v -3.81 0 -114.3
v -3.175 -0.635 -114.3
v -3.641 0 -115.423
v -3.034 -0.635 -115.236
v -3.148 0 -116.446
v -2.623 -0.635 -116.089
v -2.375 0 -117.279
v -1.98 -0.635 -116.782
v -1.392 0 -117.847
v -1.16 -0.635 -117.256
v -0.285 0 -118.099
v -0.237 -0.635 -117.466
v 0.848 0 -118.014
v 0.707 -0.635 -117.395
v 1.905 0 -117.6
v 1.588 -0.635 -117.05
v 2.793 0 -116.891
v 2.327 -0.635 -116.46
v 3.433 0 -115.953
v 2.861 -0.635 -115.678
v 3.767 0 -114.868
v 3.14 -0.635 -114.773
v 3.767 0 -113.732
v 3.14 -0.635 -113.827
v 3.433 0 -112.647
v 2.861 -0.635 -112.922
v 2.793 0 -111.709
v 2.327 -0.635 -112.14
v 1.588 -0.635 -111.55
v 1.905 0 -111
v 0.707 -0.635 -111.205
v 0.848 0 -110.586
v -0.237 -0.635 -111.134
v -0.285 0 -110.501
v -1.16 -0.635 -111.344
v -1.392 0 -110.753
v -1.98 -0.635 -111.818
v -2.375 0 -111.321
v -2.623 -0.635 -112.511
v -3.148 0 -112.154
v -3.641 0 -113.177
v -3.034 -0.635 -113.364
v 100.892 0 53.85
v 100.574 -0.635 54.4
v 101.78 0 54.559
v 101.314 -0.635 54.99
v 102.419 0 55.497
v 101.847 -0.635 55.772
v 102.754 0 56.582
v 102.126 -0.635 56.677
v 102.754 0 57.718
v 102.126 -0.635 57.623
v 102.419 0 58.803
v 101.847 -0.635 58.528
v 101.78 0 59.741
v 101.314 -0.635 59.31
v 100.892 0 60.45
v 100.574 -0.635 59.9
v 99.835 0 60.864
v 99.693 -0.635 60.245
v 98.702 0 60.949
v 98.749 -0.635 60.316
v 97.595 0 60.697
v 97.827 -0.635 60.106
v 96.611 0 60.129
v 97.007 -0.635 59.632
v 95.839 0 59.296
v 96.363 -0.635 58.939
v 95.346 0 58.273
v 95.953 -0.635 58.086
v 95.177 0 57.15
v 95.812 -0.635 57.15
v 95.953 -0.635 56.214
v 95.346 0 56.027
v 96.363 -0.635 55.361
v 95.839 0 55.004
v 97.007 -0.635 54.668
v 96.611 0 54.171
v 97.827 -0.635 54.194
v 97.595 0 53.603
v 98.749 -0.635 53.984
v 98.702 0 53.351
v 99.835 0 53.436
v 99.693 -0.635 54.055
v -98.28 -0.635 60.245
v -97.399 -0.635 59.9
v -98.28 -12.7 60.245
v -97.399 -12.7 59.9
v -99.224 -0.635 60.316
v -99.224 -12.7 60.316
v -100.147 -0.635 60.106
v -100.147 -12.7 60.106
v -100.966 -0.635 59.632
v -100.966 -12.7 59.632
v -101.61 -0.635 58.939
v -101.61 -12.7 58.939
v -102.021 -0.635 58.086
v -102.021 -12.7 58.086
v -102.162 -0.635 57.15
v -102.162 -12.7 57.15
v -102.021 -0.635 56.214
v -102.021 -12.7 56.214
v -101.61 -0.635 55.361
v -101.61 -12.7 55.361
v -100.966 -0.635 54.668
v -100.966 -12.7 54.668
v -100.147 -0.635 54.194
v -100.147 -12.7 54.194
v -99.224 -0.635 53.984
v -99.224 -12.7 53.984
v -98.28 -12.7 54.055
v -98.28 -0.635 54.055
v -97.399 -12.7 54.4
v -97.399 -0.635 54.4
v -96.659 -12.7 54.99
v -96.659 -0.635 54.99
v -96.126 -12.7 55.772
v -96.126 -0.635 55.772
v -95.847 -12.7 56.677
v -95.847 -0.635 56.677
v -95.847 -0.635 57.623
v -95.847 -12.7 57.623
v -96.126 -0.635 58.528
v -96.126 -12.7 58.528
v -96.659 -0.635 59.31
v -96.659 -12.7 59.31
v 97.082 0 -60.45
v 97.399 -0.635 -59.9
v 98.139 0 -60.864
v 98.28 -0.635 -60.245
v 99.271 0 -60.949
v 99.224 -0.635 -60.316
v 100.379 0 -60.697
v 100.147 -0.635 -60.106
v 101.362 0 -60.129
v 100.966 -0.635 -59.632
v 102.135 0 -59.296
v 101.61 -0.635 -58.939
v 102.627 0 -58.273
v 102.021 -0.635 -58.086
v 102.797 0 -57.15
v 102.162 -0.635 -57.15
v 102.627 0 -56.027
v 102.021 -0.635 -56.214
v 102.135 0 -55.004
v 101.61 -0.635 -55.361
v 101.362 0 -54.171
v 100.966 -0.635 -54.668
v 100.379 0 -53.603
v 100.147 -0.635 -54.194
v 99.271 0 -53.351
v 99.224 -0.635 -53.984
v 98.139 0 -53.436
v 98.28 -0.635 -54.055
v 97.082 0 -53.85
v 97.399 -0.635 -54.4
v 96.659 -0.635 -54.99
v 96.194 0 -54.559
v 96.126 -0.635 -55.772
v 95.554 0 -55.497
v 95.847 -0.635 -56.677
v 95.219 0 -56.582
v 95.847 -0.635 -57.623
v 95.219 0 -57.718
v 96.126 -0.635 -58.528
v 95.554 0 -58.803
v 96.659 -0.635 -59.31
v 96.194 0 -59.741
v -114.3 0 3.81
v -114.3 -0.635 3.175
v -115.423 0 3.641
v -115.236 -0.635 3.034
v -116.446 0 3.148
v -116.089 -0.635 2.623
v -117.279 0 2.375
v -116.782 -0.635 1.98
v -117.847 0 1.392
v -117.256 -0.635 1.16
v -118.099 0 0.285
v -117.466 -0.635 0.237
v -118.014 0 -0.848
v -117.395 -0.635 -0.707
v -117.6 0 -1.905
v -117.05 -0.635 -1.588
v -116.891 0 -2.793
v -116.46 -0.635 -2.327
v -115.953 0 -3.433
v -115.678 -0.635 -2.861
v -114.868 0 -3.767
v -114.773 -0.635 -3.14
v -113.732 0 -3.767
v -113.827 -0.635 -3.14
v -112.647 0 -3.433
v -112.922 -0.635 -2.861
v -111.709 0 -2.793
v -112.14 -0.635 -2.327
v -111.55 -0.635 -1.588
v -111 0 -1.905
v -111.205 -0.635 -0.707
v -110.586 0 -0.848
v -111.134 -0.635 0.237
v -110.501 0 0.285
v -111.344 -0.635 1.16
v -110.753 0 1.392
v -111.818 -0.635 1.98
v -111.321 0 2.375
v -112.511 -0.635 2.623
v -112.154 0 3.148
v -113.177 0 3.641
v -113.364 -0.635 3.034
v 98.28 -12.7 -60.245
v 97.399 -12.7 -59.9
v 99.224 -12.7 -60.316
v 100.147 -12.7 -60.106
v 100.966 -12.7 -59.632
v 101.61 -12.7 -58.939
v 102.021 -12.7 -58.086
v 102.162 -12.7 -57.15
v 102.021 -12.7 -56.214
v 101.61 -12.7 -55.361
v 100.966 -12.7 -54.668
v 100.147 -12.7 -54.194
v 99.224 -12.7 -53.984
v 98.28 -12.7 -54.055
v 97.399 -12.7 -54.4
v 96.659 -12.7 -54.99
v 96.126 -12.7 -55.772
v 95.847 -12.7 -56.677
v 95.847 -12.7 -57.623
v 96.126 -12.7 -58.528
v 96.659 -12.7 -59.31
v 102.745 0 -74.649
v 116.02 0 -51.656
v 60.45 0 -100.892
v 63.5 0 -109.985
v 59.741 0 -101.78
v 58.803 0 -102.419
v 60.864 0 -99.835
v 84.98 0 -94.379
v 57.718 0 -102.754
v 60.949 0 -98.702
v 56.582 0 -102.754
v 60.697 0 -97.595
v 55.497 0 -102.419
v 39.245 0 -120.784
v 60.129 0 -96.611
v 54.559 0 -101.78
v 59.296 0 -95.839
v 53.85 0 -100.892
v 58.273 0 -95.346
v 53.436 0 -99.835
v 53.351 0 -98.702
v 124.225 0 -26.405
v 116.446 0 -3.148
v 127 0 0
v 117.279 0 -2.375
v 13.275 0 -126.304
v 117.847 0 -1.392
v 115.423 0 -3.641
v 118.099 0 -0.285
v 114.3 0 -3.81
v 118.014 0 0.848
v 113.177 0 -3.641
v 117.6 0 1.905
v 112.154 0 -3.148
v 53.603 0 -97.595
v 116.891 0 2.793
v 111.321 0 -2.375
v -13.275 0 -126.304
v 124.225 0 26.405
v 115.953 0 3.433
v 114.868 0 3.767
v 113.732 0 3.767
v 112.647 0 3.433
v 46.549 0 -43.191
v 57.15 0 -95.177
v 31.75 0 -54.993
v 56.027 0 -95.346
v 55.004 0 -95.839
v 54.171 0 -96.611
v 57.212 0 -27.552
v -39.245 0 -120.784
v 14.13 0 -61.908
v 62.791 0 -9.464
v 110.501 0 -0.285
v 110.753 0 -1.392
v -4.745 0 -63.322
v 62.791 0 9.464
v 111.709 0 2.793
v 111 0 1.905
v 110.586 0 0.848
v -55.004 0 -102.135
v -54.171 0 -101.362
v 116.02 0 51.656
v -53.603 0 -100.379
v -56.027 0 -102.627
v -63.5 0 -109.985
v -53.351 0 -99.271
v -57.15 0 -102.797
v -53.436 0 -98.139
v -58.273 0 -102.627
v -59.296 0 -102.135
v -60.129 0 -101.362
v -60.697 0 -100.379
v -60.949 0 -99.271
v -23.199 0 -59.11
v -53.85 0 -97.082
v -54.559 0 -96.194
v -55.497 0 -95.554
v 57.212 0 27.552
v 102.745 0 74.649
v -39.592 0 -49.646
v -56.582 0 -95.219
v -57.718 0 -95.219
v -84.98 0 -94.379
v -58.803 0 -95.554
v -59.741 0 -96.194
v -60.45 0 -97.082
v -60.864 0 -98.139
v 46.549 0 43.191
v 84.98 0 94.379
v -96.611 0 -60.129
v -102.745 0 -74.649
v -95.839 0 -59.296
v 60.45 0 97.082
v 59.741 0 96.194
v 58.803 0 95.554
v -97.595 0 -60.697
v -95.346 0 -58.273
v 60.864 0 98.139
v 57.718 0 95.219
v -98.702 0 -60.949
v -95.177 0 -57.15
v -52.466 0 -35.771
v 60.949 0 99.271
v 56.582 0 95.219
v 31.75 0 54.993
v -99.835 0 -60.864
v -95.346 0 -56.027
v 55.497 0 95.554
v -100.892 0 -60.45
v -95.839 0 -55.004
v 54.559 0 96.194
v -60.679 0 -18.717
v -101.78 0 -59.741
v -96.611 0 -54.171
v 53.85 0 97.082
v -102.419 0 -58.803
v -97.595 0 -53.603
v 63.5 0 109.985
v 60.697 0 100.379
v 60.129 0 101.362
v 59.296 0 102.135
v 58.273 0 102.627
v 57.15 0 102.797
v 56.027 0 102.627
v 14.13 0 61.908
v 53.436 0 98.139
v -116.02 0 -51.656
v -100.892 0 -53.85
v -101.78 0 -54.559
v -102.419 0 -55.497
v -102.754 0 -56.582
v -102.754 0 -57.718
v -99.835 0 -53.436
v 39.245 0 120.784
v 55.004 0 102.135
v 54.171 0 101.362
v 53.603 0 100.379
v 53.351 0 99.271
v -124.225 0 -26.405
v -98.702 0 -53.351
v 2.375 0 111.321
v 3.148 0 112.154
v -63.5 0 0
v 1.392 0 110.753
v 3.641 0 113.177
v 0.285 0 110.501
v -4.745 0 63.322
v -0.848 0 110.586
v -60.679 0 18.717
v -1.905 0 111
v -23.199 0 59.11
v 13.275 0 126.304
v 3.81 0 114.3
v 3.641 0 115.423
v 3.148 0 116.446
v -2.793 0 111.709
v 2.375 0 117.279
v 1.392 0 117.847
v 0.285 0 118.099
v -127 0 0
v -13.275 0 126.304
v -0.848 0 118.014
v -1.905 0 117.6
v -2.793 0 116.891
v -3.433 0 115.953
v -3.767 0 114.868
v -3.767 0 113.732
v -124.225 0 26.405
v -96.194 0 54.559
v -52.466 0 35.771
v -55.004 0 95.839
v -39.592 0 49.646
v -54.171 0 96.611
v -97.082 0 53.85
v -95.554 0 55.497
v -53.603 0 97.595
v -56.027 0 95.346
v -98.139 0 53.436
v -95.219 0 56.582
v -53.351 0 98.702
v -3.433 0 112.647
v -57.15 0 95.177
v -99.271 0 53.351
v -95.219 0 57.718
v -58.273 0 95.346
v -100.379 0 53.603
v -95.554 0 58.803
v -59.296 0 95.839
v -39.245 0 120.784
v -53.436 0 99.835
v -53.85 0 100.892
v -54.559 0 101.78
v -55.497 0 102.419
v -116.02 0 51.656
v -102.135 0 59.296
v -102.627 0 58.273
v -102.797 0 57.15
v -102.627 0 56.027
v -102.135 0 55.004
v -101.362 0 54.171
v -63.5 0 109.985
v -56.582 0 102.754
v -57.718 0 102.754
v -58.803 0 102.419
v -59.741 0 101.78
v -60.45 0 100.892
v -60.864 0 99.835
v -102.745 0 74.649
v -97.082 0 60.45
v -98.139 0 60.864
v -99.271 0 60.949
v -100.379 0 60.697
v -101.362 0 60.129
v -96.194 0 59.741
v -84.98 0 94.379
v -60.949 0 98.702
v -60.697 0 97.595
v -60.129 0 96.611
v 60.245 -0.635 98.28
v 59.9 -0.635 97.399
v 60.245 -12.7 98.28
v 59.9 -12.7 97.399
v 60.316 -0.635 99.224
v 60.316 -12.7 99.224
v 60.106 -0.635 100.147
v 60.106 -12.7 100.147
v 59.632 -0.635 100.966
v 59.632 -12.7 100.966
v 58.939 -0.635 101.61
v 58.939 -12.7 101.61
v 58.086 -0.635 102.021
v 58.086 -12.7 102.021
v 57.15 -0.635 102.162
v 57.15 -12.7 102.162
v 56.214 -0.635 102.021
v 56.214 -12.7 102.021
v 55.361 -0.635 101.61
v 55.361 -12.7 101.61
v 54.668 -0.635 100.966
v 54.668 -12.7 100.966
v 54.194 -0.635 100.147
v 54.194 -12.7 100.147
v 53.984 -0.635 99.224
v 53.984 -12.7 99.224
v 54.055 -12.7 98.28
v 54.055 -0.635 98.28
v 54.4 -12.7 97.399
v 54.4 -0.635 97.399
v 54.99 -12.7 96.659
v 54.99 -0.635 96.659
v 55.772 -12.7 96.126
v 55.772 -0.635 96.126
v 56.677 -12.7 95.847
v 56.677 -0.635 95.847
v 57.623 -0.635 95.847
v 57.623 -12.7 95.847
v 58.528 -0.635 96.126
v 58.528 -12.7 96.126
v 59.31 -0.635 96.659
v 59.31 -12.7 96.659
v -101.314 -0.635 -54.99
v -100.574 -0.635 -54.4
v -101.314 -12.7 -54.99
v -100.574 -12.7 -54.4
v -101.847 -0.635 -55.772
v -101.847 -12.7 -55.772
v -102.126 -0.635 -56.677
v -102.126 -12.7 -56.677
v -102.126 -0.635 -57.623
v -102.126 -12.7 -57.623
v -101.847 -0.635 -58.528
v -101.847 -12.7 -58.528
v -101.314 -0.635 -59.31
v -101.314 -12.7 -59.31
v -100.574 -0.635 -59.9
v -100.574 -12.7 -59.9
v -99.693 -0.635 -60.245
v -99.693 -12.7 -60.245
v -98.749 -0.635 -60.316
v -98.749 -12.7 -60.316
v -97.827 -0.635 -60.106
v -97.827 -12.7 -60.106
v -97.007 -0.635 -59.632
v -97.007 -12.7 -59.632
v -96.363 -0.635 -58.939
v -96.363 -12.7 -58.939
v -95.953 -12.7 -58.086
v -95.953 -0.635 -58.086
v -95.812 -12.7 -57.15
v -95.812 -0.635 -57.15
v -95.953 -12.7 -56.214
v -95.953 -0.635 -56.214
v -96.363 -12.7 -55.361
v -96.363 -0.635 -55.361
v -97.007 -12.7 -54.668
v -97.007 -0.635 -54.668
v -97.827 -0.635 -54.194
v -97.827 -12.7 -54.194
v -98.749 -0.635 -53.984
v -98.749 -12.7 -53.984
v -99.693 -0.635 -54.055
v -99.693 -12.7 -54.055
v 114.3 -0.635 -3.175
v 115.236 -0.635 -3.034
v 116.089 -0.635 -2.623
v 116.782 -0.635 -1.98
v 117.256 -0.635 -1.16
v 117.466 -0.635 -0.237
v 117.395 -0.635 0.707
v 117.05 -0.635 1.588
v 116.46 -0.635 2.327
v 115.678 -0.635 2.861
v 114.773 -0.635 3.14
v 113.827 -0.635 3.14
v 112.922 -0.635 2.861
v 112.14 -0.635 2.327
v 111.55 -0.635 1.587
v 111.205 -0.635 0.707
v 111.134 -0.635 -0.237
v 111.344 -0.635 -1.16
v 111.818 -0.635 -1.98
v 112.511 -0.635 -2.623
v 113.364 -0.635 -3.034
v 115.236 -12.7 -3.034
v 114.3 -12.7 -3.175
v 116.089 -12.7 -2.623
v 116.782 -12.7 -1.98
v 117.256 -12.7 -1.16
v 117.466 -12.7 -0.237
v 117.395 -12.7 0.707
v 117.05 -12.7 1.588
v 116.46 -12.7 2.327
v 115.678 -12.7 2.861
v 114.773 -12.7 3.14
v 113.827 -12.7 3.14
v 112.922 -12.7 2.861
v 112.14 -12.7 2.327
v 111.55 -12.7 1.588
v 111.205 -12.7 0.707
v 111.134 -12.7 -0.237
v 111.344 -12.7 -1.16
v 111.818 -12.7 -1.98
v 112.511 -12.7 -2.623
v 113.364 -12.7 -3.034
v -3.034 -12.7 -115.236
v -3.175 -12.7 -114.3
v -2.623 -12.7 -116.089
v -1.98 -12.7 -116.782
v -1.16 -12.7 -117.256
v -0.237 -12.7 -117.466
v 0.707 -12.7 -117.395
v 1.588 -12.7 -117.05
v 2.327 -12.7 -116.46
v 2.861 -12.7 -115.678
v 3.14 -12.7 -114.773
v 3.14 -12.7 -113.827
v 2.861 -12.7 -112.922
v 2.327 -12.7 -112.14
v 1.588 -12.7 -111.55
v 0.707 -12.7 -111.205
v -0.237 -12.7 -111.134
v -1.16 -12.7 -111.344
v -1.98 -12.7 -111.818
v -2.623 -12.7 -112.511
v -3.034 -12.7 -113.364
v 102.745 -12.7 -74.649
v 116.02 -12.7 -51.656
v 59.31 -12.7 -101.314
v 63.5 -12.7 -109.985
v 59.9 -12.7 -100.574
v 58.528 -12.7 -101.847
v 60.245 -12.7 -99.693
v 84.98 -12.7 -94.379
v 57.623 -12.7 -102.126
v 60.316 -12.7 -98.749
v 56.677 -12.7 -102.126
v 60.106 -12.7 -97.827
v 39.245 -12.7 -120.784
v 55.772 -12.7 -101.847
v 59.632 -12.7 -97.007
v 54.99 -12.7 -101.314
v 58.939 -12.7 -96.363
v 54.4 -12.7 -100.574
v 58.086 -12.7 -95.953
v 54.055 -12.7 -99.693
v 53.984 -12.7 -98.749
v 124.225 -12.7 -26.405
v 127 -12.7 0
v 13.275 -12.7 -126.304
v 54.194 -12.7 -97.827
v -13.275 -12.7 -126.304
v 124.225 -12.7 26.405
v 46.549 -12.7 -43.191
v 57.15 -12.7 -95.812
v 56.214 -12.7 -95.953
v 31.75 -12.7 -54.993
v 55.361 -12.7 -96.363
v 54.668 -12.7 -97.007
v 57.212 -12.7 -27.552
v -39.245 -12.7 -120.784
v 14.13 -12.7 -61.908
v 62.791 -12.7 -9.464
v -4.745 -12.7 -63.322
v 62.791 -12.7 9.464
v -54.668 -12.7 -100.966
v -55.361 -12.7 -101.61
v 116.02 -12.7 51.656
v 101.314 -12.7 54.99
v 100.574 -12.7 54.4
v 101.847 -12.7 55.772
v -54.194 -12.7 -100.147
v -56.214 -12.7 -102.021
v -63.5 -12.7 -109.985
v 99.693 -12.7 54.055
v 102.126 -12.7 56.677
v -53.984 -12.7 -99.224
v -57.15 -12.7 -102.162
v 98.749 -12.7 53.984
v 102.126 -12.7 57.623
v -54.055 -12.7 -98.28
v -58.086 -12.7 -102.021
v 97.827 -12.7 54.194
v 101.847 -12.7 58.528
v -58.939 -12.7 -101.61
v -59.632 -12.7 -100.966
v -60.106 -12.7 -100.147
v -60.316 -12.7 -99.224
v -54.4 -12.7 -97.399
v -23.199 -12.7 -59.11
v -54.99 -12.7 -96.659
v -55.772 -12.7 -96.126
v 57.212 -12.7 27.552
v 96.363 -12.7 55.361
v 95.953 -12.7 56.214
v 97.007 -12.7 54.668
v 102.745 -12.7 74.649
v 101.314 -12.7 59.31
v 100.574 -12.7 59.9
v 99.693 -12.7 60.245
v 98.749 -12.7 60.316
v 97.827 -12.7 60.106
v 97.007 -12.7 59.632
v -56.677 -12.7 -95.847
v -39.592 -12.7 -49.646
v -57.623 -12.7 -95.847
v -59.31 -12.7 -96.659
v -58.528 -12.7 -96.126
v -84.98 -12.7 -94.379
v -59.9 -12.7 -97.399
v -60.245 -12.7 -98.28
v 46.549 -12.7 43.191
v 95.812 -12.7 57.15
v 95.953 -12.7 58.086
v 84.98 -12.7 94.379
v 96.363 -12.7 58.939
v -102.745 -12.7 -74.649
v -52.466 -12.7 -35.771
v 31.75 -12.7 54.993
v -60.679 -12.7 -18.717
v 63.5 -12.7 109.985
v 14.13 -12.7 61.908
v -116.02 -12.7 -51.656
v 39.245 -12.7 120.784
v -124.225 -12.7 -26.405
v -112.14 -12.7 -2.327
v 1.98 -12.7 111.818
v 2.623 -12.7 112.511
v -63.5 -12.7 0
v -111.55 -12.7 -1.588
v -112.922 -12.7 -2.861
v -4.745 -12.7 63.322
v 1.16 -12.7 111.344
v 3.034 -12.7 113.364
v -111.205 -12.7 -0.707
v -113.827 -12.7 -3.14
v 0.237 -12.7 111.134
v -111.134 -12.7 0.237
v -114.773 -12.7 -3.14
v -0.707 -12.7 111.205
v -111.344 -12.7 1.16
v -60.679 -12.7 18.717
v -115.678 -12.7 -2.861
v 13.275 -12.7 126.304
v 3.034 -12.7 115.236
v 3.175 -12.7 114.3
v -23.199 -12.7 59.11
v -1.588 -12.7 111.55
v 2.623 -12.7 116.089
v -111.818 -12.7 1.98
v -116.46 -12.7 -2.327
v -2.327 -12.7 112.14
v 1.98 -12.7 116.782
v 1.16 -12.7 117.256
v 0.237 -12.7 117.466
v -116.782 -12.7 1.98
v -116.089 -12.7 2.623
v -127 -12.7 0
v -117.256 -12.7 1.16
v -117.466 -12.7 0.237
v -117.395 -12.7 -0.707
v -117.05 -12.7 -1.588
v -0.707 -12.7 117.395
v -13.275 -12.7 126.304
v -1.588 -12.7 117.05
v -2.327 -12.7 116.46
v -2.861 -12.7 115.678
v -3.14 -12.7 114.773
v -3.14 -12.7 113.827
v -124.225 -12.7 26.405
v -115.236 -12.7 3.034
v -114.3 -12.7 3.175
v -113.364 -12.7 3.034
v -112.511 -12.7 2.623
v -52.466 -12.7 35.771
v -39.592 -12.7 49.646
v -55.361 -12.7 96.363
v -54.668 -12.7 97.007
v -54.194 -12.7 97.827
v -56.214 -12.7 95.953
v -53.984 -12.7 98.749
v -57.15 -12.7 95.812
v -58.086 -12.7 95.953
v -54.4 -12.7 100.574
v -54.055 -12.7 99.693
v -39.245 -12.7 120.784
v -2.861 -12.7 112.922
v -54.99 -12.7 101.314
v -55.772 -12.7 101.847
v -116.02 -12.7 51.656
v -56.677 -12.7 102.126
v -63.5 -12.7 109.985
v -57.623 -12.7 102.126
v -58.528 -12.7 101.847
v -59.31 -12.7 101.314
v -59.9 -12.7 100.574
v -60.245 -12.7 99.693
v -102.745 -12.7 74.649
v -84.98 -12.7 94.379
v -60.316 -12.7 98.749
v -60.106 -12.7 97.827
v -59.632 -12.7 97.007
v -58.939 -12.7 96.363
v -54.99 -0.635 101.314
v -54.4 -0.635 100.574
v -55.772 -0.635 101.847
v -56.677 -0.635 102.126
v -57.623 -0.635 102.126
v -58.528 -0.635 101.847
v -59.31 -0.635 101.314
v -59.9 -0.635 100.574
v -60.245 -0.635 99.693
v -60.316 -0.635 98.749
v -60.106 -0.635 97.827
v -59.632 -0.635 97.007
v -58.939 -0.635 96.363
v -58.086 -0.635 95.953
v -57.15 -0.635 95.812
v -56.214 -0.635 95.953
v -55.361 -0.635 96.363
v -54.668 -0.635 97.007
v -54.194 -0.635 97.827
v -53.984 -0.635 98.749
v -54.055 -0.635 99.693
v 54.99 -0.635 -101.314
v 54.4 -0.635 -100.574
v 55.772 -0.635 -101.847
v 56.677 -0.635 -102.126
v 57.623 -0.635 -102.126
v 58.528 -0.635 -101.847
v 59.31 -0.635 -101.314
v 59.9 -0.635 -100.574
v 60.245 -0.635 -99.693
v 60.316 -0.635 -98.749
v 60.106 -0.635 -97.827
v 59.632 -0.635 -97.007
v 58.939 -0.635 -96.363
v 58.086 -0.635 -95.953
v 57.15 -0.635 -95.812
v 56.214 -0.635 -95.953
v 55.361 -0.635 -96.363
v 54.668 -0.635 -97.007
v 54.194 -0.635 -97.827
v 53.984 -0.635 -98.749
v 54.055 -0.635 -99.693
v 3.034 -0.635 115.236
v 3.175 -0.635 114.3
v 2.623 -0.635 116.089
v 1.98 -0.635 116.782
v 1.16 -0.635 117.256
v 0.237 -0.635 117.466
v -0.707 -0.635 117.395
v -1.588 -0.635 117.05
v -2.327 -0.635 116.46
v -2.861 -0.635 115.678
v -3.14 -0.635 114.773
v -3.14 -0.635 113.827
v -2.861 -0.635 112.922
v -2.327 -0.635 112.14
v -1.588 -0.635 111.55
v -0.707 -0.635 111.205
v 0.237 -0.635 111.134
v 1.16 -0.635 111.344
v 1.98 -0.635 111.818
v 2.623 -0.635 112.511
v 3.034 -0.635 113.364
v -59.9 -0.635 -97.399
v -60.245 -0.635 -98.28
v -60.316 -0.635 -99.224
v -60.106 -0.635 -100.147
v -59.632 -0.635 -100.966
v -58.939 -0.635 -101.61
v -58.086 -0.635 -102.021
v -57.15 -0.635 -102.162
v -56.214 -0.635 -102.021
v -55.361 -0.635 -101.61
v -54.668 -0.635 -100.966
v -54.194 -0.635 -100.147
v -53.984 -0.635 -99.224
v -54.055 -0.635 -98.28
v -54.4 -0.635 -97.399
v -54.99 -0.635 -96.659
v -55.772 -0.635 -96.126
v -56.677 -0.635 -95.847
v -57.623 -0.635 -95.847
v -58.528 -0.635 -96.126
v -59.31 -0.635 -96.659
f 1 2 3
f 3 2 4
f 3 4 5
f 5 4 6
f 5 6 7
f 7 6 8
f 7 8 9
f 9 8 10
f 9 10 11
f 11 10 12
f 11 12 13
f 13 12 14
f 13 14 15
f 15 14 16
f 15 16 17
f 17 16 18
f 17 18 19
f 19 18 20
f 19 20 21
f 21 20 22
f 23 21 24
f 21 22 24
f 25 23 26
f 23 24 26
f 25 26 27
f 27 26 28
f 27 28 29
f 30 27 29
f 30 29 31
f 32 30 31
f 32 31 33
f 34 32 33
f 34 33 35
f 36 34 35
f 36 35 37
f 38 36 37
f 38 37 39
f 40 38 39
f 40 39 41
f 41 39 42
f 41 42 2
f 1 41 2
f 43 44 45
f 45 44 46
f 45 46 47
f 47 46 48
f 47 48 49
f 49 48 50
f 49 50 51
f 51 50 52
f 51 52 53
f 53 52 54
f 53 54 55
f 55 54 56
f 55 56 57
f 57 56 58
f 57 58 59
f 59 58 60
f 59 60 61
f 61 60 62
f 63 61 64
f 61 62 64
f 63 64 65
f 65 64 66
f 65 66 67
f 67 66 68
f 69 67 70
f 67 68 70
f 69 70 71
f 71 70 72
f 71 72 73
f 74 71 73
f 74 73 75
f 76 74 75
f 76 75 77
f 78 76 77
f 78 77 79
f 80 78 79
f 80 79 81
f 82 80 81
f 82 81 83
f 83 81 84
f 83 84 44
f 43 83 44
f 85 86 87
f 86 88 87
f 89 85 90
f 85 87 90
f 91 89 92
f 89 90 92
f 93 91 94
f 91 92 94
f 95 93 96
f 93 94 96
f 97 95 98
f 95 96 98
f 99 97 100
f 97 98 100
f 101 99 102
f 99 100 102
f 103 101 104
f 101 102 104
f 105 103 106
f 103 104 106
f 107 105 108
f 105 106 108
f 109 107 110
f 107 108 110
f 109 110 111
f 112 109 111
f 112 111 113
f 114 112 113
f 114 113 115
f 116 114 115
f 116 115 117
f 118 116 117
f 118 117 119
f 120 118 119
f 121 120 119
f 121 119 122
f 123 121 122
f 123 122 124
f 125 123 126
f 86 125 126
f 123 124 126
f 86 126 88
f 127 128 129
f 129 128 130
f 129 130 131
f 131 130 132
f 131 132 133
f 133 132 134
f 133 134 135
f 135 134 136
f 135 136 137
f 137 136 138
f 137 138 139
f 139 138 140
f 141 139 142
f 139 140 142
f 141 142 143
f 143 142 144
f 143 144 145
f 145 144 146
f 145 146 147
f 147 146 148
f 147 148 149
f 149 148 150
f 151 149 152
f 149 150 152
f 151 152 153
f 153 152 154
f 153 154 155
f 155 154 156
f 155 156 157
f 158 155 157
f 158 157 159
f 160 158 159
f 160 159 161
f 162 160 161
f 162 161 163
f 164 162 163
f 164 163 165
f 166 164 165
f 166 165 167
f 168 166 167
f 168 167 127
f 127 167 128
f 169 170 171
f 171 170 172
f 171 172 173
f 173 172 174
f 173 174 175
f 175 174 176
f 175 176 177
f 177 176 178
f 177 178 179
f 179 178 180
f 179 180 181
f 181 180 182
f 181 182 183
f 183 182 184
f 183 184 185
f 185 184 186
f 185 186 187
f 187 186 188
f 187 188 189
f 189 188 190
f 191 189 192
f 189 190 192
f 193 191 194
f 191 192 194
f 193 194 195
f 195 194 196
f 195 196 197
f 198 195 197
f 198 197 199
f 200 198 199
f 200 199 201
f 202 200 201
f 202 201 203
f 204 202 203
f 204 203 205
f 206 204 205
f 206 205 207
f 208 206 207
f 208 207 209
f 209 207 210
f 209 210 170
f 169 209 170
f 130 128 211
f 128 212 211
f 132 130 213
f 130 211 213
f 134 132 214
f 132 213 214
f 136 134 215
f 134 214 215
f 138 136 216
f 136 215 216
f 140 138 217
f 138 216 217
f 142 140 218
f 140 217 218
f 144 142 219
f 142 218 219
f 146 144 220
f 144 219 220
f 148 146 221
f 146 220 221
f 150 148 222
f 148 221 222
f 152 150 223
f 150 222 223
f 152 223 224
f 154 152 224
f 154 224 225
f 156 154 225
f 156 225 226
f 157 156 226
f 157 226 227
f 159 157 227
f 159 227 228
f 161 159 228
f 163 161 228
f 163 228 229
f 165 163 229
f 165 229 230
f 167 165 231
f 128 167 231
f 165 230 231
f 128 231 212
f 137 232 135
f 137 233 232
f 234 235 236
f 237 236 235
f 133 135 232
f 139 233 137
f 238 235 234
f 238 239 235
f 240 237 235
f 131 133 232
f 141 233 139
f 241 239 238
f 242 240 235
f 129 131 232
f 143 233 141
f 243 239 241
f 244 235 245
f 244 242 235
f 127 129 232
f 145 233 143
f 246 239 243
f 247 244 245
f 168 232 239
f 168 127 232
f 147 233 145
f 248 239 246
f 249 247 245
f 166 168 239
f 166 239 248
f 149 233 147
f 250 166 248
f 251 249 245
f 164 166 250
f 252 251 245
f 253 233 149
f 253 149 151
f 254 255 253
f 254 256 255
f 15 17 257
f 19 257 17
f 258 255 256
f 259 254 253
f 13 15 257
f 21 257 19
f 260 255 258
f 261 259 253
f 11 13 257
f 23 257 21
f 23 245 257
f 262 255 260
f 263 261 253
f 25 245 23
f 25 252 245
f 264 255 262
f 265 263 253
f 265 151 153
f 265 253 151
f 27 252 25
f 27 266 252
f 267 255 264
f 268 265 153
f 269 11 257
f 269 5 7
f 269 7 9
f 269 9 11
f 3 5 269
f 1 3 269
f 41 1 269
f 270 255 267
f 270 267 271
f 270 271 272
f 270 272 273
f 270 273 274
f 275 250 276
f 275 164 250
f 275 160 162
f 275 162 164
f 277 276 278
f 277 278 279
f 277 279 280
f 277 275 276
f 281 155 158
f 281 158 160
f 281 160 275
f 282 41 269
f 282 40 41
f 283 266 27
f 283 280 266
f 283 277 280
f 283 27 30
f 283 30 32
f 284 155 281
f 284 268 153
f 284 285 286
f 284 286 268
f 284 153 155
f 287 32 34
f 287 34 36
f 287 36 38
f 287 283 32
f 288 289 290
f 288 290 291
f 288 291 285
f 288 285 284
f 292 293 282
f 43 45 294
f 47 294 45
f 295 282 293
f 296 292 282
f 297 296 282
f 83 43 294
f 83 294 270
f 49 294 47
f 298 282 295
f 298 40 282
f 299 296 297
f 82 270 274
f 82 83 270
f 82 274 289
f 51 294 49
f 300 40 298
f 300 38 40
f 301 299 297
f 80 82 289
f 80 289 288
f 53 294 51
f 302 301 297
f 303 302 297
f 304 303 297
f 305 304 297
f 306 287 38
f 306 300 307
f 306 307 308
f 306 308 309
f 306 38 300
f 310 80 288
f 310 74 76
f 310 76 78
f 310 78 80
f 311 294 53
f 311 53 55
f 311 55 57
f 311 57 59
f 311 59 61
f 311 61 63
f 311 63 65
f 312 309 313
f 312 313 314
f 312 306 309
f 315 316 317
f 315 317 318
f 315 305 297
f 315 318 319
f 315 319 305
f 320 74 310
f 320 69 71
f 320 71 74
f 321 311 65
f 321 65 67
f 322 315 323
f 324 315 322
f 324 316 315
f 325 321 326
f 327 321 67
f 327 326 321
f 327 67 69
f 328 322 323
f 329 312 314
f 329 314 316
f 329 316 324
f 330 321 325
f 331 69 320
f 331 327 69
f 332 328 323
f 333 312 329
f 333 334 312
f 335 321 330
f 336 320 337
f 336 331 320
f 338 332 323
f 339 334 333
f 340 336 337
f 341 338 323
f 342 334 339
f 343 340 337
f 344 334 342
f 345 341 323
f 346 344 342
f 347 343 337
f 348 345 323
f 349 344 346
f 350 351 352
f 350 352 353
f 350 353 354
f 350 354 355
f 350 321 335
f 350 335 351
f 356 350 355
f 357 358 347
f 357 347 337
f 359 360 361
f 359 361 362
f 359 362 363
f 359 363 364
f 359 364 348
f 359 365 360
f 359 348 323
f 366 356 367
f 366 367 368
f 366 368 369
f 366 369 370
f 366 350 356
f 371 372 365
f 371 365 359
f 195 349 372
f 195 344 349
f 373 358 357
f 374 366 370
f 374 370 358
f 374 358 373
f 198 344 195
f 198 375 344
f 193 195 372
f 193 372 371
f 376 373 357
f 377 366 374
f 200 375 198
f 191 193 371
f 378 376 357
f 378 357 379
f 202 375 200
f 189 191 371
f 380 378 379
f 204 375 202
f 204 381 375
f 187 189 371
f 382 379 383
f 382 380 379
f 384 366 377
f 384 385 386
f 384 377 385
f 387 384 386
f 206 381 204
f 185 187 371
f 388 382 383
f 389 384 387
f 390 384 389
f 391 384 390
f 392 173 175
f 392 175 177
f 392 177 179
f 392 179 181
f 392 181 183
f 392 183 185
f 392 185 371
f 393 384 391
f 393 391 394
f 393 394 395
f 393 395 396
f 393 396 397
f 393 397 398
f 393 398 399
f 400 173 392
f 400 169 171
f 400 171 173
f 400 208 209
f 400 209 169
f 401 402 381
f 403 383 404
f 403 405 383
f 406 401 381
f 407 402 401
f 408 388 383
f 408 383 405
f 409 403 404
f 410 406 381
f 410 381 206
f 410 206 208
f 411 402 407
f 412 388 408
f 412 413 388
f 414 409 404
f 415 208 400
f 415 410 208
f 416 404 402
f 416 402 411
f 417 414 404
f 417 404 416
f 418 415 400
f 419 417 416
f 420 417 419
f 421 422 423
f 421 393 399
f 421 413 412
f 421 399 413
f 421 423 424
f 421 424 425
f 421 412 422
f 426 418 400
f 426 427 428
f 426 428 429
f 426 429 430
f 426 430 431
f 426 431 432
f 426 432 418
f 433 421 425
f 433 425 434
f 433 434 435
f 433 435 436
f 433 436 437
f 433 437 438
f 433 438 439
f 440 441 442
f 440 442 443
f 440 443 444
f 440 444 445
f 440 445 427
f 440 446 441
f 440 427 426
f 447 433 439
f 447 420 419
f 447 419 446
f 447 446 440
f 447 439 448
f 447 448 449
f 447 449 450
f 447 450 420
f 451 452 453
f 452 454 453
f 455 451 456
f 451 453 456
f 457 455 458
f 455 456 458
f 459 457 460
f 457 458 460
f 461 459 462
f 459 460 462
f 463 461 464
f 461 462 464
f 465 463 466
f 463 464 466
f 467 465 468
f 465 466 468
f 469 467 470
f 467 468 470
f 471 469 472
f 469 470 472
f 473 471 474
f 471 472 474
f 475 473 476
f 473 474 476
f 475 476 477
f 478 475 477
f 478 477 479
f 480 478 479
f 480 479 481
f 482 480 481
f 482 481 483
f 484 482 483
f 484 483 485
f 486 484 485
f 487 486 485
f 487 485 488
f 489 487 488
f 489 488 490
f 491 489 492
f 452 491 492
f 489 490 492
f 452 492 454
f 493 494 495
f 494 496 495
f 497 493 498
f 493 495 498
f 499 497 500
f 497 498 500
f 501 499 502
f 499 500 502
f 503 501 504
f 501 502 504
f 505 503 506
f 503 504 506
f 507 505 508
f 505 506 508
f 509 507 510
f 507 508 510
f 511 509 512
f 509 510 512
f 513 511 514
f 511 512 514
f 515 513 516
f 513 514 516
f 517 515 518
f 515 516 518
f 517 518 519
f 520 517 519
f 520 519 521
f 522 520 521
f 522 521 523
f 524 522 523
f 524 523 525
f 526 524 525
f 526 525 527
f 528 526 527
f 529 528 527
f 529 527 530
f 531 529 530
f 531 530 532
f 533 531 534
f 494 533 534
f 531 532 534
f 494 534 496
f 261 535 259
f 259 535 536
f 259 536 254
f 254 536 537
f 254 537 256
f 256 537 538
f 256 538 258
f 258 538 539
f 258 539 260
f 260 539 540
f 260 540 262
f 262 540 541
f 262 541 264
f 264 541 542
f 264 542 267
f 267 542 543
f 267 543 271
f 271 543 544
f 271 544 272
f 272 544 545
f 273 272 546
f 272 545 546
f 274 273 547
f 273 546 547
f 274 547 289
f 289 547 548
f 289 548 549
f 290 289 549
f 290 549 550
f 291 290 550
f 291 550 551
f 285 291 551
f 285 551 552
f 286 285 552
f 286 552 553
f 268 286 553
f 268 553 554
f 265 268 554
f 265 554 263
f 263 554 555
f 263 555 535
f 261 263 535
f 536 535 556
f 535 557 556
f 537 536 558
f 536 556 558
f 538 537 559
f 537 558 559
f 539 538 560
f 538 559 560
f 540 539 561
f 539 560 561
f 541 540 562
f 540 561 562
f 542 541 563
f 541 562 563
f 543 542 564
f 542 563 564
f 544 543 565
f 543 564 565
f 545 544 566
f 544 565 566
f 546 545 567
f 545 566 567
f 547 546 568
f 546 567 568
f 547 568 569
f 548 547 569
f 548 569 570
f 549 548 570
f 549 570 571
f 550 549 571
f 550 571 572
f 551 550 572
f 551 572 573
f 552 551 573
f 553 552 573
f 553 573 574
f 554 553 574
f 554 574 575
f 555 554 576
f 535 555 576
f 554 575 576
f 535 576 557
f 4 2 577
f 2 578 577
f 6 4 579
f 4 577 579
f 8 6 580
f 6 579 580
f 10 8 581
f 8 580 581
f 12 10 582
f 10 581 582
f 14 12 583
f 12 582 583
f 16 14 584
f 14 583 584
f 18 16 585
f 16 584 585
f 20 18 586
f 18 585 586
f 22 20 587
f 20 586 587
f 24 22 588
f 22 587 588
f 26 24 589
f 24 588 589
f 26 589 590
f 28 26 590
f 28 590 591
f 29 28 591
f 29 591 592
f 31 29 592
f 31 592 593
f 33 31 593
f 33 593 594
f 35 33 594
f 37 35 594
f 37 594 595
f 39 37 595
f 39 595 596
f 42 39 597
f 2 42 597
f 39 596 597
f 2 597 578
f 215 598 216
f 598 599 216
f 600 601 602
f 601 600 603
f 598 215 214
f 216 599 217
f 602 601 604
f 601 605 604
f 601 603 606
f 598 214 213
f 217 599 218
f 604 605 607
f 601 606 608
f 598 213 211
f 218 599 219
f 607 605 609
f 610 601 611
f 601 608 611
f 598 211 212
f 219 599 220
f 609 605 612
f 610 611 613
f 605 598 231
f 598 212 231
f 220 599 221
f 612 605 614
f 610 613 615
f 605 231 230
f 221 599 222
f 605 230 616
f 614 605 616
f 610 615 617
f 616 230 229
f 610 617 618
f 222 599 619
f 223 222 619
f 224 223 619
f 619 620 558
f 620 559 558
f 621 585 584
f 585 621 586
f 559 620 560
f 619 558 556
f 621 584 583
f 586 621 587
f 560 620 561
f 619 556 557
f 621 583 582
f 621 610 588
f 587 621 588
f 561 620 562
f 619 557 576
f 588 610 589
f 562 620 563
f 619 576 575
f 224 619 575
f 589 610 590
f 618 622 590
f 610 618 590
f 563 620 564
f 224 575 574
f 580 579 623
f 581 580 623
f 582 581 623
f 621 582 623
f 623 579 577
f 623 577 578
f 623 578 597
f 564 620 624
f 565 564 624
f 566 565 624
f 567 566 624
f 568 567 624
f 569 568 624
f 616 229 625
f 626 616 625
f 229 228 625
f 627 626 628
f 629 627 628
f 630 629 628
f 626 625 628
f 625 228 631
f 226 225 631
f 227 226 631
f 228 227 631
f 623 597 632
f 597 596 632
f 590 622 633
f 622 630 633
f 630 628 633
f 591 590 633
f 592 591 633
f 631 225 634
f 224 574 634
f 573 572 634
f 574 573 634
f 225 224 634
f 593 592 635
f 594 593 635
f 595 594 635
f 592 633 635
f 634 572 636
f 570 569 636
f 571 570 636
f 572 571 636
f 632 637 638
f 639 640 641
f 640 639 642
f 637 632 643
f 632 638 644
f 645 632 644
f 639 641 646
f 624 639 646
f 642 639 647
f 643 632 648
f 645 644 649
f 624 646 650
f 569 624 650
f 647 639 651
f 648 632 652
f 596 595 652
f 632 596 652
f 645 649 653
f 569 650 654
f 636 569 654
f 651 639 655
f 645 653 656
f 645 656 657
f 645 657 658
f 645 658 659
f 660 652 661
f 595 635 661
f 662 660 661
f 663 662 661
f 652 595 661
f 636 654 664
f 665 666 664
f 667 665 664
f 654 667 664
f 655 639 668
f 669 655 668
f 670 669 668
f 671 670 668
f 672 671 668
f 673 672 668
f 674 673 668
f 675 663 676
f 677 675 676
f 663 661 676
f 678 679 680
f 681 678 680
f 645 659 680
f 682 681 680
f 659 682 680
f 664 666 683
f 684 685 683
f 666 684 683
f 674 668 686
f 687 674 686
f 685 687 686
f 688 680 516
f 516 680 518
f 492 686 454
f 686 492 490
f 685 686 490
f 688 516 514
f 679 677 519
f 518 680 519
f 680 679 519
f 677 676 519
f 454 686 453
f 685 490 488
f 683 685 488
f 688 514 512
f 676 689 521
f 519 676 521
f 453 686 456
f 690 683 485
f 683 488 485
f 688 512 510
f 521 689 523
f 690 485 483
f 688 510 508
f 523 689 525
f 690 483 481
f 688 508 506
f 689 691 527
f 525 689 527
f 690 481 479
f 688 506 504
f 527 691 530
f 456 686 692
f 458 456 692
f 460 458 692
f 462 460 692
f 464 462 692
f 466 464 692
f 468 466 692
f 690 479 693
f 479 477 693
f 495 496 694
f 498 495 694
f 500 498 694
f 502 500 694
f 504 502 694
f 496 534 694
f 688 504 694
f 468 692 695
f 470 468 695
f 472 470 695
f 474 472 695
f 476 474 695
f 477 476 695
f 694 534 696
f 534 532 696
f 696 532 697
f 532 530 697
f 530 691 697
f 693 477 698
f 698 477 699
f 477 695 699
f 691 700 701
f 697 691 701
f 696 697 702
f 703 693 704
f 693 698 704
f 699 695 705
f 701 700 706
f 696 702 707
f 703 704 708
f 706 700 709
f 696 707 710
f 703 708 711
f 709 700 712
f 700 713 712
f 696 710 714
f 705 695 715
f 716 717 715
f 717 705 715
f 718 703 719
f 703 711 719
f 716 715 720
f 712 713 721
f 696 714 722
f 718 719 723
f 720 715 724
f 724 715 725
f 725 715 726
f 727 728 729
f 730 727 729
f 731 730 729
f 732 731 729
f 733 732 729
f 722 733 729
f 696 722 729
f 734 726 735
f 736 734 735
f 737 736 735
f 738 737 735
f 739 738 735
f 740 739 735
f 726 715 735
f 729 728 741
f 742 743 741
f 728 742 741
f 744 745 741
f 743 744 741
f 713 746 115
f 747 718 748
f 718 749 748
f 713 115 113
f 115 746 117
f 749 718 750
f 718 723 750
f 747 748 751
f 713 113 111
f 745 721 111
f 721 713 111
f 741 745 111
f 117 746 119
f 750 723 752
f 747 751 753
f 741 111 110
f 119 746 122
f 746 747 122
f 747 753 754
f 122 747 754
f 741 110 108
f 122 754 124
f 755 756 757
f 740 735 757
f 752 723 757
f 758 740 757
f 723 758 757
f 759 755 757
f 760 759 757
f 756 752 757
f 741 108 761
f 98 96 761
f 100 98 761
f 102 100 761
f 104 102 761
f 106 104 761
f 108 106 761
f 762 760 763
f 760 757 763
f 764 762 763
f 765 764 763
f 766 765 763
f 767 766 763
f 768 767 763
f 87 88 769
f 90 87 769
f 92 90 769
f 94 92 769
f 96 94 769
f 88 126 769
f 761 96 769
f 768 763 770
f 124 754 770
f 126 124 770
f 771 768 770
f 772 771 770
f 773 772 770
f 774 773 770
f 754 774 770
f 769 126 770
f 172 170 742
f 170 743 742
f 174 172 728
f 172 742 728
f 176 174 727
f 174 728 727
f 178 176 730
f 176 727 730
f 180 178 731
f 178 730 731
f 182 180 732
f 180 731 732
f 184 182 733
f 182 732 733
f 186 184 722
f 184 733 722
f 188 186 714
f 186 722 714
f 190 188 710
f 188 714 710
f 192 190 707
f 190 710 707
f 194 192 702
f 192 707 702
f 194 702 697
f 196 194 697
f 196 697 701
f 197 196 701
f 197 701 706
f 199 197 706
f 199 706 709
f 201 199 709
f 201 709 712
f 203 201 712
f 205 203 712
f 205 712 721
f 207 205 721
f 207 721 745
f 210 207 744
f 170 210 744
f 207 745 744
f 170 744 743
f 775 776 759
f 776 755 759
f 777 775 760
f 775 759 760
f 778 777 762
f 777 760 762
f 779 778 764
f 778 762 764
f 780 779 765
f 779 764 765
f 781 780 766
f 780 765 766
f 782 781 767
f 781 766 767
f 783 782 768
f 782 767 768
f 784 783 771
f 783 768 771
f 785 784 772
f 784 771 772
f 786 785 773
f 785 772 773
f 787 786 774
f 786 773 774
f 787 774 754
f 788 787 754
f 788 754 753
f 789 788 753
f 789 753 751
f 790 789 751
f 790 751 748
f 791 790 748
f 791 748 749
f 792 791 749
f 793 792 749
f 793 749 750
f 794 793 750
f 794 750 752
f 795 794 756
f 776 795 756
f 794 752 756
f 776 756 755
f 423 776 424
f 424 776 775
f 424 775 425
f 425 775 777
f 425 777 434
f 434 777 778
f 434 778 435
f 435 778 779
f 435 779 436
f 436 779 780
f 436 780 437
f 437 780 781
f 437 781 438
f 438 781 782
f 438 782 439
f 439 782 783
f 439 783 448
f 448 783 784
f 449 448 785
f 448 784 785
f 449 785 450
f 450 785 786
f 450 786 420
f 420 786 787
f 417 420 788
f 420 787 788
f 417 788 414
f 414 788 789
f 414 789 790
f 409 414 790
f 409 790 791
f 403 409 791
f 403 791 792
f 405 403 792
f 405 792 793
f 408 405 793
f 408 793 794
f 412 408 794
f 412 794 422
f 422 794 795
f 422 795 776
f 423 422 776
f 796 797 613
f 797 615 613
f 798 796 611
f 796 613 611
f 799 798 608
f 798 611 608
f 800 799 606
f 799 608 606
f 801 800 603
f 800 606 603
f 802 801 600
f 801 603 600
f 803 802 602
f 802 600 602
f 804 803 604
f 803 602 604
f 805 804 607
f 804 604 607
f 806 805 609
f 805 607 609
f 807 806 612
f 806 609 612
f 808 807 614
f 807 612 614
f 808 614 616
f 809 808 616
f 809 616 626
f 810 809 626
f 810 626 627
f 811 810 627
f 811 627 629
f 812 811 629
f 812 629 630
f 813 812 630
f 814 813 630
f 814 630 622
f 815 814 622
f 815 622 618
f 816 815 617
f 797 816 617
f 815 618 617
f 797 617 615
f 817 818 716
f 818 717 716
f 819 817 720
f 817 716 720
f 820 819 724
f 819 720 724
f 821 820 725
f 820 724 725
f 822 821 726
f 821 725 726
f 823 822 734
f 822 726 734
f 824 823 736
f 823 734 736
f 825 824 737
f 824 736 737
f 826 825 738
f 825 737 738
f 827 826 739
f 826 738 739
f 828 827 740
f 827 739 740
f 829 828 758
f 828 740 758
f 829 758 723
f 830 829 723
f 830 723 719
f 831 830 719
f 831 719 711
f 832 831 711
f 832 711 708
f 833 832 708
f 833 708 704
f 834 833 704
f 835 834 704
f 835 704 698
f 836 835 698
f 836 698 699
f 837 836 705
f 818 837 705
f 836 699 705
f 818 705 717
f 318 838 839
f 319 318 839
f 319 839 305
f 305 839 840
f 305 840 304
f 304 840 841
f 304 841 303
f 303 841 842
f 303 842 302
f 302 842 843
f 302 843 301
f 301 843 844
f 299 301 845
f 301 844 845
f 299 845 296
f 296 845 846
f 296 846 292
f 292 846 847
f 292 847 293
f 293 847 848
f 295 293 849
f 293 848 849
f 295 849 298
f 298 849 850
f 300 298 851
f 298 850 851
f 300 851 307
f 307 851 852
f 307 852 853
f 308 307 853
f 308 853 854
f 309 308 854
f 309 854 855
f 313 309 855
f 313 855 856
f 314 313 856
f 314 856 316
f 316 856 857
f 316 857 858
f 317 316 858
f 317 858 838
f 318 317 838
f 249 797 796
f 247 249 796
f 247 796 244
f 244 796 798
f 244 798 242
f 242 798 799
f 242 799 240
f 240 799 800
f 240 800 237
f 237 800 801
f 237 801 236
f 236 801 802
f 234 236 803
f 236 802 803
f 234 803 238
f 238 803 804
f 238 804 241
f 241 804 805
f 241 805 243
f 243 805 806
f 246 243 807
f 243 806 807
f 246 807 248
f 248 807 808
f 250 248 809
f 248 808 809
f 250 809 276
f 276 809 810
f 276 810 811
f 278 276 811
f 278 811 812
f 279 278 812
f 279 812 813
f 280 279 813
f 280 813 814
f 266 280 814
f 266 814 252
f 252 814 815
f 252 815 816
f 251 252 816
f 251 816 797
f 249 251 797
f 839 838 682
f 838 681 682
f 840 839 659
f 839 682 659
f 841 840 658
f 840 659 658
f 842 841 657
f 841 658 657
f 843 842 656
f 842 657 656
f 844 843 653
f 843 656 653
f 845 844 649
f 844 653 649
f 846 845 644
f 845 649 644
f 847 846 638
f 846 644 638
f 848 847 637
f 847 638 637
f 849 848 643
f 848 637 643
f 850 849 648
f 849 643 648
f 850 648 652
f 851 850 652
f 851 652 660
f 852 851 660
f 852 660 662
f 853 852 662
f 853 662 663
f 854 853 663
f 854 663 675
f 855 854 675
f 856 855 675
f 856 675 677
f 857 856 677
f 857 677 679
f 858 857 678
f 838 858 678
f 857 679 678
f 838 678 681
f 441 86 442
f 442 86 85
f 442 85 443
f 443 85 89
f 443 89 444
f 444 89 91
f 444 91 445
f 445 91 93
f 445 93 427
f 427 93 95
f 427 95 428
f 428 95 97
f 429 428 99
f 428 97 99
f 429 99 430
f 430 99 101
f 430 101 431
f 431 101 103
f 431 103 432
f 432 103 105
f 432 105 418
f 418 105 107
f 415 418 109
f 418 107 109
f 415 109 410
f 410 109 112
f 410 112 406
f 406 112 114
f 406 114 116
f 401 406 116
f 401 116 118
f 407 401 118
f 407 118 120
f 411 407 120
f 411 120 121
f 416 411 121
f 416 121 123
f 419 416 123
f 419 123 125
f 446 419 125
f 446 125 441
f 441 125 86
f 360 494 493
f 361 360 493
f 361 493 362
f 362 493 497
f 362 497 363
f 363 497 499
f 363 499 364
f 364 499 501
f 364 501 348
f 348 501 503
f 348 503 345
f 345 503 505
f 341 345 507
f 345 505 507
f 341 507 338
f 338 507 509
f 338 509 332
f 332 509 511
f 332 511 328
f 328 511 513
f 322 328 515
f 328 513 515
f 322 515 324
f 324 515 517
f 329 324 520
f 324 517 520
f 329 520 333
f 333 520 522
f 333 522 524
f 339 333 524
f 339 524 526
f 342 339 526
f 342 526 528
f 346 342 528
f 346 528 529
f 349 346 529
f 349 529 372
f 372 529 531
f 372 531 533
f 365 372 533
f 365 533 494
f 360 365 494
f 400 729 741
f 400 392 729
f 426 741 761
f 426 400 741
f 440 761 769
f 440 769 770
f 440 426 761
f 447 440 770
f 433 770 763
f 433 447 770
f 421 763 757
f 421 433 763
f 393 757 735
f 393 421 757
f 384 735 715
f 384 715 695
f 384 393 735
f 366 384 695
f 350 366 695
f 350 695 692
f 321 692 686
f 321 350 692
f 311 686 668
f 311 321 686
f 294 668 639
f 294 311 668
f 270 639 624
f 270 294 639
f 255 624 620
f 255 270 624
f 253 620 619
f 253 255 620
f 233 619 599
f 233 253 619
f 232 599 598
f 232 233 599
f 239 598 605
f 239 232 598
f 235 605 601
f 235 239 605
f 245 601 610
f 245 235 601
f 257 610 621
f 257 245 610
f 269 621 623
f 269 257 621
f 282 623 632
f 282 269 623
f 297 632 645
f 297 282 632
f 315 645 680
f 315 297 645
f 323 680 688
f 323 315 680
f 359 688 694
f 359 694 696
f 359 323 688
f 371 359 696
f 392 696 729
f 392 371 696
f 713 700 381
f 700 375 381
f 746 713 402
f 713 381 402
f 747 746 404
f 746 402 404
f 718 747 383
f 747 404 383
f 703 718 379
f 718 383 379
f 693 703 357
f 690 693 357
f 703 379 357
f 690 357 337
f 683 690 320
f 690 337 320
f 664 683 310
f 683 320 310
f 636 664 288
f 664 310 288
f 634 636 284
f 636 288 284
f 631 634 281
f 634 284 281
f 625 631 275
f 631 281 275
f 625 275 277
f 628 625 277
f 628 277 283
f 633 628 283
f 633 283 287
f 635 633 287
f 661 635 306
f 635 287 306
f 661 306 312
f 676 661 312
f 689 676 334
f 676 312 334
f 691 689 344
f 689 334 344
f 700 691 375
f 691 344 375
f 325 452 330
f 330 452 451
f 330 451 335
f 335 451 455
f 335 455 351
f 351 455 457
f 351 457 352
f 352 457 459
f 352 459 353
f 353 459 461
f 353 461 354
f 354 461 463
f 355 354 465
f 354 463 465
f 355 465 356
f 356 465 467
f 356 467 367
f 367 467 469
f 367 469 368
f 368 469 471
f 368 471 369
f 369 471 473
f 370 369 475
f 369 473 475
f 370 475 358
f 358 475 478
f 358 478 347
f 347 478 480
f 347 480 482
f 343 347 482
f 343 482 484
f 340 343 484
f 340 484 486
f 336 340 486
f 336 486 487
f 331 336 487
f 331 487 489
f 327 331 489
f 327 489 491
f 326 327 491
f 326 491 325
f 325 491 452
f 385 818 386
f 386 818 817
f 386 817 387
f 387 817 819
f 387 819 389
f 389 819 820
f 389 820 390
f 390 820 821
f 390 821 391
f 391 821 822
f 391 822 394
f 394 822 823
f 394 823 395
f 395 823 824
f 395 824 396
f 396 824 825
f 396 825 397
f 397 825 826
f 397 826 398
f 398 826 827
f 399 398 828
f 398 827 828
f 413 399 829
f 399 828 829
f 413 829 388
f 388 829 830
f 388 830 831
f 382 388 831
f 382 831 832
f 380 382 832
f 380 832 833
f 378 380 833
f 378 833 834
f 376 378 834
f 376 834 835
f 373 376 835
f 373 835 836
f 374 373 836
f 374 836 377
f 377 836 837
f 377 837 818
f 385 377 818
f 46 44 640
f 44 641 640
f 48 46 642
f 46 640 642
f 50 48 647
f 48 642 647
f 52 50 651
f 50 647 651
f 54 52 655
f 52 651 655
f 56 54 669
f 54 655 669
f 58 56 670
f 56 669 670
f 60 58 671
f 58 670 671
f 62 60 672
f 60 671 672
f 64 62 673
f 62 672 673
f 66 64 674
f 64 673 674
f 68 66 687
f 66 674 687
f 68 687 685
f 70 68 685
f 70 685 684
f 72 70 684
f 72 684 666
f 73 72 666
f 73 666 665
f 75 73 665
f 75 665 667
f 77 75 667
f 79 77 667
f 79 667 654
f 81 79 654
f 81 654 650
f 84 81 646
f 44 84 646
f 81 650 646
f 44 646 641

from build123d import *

# Parameters (mm, degrees)
SKETCH1_W                             = 63.5
SKETCH1_H                             = 12.7
F_1_4_0_25_DIAMETER_HOLE1_D           = 6.35
F_1_4_0_25_DIAMETER_HOLE1_CSINK_D     = 7.62
F_1_4_0_25_DIAMETER_HOLE1_CSINK_ANGLE = 90
CIRPATTERN1_COUNT                     = 12


with BuildPart() as part:
    # Sketch1 → Revolve1 (revolve)
    with BuildSketch(Plane.XY):
        with Locations((-95.25, -6.35)):
            Rectangle(SKETCH1_W, SKETCH1_H)
    revolve(axis=Axis((0, 0, 0), (0, 1, 0)))

    # 1/4 (0.25) Diameter Hole1 (through all)
    with Locations(Plane(origin=(114.3, 0, 0), x_dir=(0, 0, 1), z_dir=(0, 1, 0))):
        with Locations((0, 0)):
            f_1_4_0_25_diameter_hole1 = CounterSinkHole(F_1_4_0_25_DIAMETER_HOLE1_D / 2, F_1_4_0_25_DIAMETER_HOLE1_CSINK_D / 2, counter_sink_angle=F_1_4_0_25_DIAMETER_HOLE1_CSINK_ANGLE)

    # CirPattern1: 1/4 (0.25) Diameter Hole1 ×12 about axis
    cirpattern1_axis = Axis((0, 0, 0), (0, 1, 0))
    for i in range(1, CIRPATTERN1_COUNT):
        add(f_1_4_0_25_diameter_hole1.rotate(cirpattern1_axis, i * 360 / CIRPATTERN1_COUNT), mode=Mode.SUBTRACT)


solid = part.part
